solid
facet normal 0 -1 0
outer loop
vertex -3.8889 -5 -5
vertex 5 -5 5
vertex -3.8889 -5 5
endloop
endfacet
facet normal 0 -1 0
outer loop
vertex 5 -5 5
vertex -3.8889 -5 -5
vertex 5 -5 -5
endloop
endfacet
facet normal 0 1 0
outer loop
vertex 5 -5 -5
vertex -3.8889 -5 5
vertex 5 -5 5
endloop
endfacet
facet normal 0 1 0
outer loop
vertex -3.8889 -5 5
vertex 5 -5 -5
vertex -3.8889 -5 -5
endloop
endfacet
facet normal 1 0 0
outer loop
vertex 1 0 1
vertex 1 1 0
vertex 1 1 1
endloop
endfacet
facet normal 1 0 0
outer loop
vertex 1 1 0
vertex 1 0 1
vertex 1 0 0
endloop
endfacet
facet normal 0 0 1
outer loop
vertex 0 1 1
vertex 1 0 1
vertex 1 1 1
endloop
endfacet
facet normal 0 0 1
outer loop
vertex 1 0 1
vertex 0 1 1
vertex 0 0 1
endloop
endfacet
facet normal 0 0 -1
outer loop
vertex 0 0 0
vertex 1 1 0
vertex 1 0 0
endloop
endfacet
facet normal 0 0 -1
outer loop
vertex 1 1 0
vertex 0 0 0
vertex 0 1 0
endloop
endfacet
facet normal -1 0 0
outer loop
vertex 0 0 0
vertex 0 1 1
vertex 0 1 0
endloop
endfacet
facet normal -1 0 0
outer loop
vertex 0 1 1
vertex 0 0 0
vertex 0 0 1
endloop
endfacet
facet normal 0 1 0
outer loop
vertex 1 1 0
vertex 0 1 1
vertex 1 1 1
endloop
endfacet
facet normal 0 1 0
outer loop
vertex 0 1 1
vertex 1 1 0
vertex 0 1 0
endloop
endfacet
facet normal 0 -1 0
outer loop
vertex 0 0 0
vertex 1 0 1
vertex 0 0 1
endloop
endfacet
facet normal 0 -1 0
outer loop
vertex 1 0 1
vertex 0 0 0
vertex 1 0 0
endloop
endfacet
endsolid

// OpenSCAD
a = 1.1111111111111107;
b = -10;

module main() {
    intersection() {
        translate([a, 0, 0])
            cube(10, center=true);
        translate([0, b, 0])
            cube(10, center=true);
    }
    cube(1);
}

main();
